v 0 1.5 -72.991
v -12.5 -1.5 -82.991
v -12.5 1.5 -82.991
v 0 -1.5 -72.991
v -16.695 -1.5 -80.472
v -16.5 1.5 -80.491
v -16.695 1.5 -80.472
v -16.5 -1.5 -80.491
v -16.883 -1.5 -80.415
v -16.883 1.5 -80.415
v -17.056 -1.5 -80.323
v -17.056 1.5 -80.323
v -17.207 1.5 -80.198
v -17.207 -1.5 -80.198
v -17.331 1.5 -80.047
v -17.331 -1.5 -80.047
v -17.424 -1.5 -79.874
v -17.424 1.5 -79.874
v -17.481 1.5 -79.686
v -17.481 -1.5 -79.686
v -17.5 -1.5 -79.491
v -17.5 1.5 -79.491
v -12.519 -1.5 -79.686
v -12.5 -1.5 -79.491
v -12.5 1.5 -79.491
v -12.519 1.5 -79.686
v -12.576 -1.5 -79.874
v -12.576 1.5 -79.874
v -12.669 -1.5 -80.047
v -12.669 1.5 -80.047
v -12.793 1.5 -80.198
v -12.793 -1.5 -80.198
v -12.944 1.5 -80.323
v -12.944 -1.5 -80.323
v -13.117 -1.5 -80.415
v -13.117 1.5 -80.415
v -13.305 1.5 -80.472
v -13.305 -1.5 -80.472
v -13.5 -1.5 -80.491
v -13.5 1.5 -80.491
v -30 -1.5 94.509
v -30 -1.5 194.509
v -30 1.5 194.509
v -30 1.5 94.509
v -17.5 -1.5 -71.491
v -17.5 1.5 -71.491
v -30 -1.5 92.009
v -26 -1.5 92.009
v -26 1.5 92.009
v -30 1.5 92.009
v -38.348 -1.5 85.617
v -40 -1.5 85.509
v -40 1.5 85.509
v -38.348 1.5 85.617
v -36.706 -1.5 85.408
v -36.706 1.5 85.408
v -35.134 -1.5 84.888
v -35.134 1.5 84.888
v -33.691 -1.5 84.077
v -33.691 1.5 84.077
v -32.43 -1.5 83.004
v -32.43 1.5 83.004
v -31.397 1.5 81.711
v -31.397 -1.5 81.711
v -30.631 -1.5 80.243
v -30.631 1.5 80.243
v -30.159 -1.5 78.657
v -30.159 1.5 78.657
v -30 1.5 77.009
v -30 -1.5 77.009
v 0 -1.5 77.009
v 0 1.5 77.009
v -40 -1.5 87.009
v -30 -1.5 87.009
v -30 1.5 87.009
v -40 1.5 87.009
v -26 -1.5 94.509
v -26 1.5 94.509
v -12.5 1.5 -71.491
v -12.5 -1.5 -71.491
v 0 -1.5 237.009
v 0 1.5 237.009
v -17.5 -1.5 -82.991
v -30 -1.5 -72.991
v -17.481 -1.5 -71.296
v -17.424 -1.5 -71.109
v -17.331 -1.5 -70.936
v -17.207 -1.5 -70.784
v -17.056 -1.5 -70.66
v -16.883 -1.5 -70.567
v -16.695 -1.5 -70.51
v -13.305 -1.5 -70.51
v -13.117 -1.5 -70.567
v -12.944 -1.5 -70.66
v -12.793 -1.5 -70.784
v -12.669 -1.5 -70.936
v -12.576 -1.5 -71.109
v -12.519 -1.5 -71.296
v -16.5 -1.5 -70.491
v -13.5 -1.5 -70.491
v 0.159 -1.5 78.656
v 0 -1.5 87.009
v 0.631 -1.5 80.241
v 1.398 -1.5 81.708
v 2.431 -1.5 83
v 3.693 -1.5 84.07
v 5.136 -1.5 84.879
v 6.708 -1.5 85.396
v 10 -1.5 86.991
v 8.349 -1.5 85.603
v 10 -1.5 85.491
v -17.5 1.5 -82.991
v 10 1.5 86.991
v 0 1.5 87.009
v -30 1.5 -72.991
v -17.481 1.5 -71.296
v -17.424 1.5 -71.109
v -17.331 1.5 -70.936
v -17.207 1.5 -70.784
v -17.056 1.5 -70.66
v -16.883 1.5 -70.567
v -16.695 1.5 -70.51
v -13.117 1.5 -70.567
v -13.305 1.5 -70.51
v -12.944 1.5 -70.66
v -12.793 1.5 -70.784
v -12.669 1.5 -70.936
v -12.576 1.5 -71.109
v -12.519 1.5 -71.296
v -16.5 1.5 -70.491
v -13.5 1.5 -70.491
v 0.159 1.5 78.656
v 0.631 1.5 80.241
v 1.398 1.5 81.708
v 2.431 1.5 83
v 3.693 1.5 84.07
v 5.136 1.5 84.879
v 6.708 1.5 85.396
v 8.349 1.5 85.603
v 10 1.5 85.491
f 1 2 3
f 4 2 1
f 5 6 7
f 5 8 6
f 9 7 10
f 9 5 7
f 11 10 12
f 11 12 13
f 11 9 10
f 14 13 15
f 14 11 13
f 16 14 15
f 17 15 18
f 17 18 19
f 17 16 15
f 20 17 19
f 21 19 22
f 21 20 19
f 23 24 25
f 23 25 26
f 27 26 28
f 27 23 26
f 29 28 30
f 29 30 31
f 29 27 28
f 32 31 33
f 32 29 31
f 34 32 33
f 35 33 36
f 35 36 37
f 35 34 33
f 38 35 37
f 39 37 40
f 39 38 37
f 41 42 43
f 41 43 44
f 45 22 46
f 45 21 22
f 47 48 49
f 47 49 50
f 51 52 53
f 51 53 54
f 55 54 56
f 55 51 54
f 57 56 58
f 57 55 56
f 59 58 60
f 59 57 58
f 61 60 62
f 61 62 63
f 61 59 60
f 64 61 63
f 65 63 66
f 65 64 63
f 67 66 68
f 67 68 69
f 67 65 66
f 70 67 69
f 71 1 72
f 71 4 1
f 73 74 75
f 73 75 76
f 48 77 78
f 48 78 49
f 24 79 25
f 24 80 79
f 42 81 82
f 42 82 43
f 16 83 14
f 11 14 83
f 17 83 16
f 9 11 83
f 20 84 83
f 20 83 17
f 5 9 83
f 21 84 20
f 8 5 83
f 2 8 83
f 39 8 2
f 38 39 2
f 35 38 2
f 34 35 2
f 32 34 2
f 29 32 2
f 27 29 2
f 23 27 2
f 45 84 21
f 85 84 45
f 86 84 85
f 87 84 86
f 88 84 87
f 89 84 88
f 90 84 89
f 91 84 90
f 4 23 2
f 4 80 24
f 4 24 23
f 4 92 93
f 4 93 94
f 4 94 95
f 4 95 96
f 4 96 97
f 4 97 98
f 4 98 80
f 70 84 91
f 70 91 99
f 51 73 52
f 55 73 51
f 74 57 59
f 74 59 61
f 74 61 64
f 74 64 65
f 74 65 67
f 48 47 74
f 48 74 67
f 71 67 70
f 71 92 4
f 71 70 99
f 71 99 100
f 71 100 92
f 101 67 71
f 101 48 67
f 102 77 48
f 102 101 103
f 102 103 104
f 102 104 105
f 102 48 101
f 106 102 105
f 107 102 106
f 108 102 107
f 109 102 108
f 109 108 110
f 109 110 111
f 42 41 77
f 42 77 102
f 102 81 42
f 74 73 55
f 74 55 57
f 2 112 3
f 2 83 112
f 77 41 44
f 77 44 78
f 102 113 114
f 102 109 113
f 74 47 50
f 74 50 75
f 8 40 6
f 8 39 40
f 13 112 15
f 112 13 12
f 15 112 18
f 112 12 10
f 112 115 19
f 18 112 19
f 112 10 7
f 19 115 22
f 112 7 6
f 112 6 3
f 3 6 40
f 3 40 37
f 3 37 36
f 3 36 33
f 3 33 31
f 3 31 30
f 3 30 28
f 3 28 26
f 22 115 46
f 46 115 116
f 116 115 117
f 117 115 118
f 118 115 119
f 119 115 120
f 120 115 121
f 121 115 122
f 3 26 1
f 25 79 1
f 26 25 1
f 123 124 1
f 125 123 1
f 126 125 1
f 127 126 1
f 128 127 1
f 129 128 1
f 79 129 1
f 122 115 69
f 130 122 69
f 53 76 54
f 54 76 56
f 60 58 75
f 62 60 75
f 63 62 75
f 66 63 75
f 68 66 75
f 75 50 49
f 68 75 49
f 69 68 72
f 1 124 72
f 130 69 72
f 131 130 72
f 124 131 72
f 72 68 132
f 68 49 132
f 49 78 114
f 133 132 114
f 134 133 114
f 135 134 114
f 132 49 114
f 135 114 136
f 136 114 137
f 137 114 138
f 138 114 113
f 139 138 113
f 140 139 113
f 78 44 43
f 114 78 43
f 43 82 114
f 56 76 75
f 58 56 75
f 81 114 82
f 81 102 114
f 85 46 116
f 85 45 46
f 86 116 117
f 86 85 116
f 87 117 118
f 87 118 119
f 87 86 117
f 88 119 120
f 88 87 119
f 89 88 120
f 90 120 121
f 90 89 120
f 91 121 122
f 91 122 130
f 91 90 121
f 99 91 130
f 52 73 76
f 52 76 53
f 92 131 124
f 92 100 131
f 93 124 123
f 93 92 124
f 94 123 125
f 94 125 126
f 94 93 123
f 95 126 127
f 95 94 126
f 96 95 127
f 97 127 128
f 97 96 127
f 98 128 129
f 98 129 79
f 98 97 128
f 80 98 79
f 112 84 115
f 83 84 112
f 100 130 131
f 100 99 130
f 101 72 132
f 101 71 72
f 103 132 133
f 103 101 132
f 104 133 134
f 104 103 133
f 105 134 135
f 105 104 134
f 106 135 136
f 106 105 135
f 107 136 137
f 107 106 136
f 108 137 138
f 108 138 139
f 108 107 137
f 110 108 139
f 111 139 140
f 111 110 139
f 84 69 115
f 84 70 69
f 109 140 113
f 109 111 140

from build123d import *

# Parameters (mm, degrees)
F1_DEPTH = 1.5


with BuildPart() as f1:
    # F0 (on Front) → F1 (new body, symmetric)
    with BuildSketch(Plane.XZ):
        with BuildLine():
            Line((0, 87.008731), (0, 237.008731))
            Line((0, 237.008731), (-30, 194.508731))
            Line((-30, 194.508731), (-30, 94.508731))
            Line((-30, 94.508731), (-26, 94.508731))
            Line((-26, 94.508731), (-26, 92.008731))
            Line((-26, 92.008731), (-30, 92.008731))
            Line((-30, 92.008731), (-30, 87.008731))
            Line((-30, 87.008731), (-40, 87.008731))
            Line((-40, 87.008731), (-40, 85.508731))
            ThreePointArc((-40, 85.508731), (-33.034628, 83.570933), (-30, 77.008731))
            Line((-30, 77.008731), (-30, -72.991269))
            Line((-30, -72.991269), (-17.5, -82.991269))
            Line((-17.5, -82.991269), (-12.5, -82.991269))
            Line((-12.5, -82.991269), (0, -72.991269))
            Line((0, -72.991269), (0, 77.008731))
            ThreePointArc((0, 77.008731), (3.036062, 83.565217), (9.999984, 85.491087))
            Line((9.999984, 85.491087), (9.999984, 86.991087))
            Line((9.999984, 86.991087), (0, 87.008731))
        make_face()
        with BuildLine():
            ThreePointArc((-12.5, -79.491269), (-12.792893, -80.198376), (-13.5, -80.491269))
            Line((-13.5, -80.491269), (-16.5, -80.491269))
            ThreePointArc((-16.5, -80.491269), (-17.207107, -80.198376), (-17.5, -79.491269))
            Line((-17.5, -79.491269), (-17.5, -71.491269))
            ThreePointArc((-17.5, -71.491269), (-17.207107, -70.784163), (-16.5, -70.491269))
            Line((-16.5, -70.491269), (-13.5, -70.491269))
            ThreePointArc((-13.5, -70.491269), (-12.792893, -70.784163), (-12.5, -71.491269))
            Line((-12.5, -71.491269), (-12.5, -79.491269))
        make_face(mode=Mode.SUBTRACT)
    extrude(amount=F1_DEPTH, both=True)


solid = f1.part
